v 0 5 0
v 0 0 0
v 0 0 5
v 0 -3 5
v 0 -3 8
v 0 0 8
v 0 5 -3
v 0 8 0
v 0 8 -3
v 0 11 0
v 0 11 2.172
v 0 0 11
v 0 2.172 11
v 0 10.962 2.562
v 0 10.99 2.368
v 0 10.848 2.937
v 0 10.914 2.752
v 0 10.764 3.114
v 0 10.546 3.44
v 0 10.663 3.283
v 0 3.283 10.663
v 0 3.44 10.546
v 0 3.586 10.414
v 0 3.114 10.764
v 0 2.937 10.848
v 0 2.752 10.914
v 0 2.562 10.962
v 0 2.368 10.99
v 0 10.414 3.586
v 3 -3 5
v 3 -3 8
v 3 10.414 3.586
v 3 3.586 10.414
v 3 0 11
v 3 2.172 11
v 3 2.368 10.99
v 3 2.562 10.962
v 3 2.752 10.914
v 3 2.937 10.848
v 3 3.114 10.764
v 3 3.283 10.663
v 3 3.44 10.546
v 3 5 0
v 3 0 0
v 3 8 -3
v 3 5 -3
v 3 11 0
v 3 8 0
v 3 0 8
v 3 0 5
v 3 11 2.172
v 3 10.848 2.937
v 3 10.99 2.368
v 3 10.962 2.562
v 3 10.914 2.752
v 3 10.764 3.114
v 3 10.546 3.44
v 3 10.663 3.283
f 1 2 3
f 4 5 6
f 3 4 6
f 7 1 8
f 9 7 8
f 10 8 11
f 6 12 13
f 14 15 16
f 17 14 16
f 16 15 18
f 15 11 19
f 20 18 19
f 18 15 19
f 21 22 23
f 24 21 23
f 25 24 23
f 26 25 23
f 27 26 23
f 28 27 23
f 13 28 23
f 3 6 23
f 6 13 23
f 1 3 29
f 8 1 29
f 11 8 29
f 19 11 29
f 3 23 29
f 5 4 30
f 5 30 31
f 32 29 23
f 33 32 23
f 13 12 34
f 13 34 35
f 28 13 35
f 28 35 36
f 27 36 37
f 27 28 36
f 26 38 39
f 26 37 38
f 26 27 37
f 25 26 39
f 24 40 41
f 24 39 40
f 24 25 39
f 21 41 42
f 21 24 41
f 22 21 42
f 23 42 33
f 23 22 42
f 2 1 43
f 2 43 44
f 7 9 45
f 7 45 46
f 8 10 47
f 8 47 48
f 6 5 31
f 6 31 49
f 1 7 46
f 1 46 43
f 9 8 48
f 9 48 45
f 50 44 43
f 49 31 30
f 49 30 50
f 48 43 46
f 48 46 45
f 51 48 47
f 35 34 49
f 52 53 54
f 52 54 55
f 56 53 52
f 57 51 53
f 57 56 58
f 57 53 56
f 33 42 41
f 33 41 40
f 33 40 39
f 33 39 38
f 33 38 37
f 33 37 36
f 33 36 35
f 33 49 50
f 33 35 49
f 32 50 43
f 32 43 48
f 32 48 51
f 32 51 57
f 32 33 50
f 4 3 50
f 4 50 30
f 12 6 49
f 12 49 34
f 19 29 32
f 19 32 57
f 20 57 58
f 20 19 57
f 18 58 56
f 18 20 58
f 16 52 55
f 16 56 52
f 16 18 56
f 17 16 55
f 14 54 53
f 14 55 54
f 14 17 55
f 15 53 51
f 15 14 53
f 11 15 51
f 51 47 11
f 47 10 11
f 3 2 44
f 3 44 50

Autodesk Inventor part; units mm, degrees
ref_plane "YZ Plane" through (0, 0, 0) normal (1, 0, 0) x (0, 1, 0)
ref_plane "XZ Plane" through (0, 0, 0) normal (0, 1, 0) x (-1, 0, 0)
ref_plane "XY Plane" through (0, 0, 0) normal (0, 0, 1) x (1, 0, 0)
sketch "Sketch1" plane through (0, 0, 0) normal (1, 0, 0) x (0, 1, 0)
  line L0 (0, 0) -> (0, 5)
  line L1 (0, 5) -> (-3, 5)
  line L2 (-3, 5) -> (-3, 8)
  line L3 (-3, 8) -> (0, 8)
  line L4 (0, 8) -> (0, 11)
  line L5 (0, 11) -> (2.1716, 11)
  line L6 (11, 0) -> (8, 0)
  line L7 (8, 0) -> (8, -3)
  line L8 (8, -3) -> (5, -3)
  line L9 (5, -3) -> (5, 0)
  line L10 (5, 0) -> (0, 0)
  line L11 (11, 0) -> (11, 2.1716)
  line L12 (10.4142, 3.5858) -> (3.5858, 10.4142)
  arc A0 (3.5858, 10.4142) -> (2.1716, 11) centre (2.1716, 9) ccw
  arc A1 (11, 2.1716) -> (10.4142, 3.5858) centre (9, 2.1716) ccw
  point P0 (3, 11)
  point P1 (11, 3)
  dimension "d0" = 5
  dimension "d1" = 3
  dimension "d2" = 3
  dimension "d3" = 5
  dimension "d4" = 3
  dimension "d5" = 3
  dimension "d6" = 3
  dimension "d7" = 3
  dimension "d8" = 3
  dimension "d9" = 3
  dimension "d10" = 3
  dimension "d11" = 3
  dimension "d14" = 2
extrude "Extrusion1" add sketch "Sketch1" along normal blind 3
properties part number "Endplate_B Support"
